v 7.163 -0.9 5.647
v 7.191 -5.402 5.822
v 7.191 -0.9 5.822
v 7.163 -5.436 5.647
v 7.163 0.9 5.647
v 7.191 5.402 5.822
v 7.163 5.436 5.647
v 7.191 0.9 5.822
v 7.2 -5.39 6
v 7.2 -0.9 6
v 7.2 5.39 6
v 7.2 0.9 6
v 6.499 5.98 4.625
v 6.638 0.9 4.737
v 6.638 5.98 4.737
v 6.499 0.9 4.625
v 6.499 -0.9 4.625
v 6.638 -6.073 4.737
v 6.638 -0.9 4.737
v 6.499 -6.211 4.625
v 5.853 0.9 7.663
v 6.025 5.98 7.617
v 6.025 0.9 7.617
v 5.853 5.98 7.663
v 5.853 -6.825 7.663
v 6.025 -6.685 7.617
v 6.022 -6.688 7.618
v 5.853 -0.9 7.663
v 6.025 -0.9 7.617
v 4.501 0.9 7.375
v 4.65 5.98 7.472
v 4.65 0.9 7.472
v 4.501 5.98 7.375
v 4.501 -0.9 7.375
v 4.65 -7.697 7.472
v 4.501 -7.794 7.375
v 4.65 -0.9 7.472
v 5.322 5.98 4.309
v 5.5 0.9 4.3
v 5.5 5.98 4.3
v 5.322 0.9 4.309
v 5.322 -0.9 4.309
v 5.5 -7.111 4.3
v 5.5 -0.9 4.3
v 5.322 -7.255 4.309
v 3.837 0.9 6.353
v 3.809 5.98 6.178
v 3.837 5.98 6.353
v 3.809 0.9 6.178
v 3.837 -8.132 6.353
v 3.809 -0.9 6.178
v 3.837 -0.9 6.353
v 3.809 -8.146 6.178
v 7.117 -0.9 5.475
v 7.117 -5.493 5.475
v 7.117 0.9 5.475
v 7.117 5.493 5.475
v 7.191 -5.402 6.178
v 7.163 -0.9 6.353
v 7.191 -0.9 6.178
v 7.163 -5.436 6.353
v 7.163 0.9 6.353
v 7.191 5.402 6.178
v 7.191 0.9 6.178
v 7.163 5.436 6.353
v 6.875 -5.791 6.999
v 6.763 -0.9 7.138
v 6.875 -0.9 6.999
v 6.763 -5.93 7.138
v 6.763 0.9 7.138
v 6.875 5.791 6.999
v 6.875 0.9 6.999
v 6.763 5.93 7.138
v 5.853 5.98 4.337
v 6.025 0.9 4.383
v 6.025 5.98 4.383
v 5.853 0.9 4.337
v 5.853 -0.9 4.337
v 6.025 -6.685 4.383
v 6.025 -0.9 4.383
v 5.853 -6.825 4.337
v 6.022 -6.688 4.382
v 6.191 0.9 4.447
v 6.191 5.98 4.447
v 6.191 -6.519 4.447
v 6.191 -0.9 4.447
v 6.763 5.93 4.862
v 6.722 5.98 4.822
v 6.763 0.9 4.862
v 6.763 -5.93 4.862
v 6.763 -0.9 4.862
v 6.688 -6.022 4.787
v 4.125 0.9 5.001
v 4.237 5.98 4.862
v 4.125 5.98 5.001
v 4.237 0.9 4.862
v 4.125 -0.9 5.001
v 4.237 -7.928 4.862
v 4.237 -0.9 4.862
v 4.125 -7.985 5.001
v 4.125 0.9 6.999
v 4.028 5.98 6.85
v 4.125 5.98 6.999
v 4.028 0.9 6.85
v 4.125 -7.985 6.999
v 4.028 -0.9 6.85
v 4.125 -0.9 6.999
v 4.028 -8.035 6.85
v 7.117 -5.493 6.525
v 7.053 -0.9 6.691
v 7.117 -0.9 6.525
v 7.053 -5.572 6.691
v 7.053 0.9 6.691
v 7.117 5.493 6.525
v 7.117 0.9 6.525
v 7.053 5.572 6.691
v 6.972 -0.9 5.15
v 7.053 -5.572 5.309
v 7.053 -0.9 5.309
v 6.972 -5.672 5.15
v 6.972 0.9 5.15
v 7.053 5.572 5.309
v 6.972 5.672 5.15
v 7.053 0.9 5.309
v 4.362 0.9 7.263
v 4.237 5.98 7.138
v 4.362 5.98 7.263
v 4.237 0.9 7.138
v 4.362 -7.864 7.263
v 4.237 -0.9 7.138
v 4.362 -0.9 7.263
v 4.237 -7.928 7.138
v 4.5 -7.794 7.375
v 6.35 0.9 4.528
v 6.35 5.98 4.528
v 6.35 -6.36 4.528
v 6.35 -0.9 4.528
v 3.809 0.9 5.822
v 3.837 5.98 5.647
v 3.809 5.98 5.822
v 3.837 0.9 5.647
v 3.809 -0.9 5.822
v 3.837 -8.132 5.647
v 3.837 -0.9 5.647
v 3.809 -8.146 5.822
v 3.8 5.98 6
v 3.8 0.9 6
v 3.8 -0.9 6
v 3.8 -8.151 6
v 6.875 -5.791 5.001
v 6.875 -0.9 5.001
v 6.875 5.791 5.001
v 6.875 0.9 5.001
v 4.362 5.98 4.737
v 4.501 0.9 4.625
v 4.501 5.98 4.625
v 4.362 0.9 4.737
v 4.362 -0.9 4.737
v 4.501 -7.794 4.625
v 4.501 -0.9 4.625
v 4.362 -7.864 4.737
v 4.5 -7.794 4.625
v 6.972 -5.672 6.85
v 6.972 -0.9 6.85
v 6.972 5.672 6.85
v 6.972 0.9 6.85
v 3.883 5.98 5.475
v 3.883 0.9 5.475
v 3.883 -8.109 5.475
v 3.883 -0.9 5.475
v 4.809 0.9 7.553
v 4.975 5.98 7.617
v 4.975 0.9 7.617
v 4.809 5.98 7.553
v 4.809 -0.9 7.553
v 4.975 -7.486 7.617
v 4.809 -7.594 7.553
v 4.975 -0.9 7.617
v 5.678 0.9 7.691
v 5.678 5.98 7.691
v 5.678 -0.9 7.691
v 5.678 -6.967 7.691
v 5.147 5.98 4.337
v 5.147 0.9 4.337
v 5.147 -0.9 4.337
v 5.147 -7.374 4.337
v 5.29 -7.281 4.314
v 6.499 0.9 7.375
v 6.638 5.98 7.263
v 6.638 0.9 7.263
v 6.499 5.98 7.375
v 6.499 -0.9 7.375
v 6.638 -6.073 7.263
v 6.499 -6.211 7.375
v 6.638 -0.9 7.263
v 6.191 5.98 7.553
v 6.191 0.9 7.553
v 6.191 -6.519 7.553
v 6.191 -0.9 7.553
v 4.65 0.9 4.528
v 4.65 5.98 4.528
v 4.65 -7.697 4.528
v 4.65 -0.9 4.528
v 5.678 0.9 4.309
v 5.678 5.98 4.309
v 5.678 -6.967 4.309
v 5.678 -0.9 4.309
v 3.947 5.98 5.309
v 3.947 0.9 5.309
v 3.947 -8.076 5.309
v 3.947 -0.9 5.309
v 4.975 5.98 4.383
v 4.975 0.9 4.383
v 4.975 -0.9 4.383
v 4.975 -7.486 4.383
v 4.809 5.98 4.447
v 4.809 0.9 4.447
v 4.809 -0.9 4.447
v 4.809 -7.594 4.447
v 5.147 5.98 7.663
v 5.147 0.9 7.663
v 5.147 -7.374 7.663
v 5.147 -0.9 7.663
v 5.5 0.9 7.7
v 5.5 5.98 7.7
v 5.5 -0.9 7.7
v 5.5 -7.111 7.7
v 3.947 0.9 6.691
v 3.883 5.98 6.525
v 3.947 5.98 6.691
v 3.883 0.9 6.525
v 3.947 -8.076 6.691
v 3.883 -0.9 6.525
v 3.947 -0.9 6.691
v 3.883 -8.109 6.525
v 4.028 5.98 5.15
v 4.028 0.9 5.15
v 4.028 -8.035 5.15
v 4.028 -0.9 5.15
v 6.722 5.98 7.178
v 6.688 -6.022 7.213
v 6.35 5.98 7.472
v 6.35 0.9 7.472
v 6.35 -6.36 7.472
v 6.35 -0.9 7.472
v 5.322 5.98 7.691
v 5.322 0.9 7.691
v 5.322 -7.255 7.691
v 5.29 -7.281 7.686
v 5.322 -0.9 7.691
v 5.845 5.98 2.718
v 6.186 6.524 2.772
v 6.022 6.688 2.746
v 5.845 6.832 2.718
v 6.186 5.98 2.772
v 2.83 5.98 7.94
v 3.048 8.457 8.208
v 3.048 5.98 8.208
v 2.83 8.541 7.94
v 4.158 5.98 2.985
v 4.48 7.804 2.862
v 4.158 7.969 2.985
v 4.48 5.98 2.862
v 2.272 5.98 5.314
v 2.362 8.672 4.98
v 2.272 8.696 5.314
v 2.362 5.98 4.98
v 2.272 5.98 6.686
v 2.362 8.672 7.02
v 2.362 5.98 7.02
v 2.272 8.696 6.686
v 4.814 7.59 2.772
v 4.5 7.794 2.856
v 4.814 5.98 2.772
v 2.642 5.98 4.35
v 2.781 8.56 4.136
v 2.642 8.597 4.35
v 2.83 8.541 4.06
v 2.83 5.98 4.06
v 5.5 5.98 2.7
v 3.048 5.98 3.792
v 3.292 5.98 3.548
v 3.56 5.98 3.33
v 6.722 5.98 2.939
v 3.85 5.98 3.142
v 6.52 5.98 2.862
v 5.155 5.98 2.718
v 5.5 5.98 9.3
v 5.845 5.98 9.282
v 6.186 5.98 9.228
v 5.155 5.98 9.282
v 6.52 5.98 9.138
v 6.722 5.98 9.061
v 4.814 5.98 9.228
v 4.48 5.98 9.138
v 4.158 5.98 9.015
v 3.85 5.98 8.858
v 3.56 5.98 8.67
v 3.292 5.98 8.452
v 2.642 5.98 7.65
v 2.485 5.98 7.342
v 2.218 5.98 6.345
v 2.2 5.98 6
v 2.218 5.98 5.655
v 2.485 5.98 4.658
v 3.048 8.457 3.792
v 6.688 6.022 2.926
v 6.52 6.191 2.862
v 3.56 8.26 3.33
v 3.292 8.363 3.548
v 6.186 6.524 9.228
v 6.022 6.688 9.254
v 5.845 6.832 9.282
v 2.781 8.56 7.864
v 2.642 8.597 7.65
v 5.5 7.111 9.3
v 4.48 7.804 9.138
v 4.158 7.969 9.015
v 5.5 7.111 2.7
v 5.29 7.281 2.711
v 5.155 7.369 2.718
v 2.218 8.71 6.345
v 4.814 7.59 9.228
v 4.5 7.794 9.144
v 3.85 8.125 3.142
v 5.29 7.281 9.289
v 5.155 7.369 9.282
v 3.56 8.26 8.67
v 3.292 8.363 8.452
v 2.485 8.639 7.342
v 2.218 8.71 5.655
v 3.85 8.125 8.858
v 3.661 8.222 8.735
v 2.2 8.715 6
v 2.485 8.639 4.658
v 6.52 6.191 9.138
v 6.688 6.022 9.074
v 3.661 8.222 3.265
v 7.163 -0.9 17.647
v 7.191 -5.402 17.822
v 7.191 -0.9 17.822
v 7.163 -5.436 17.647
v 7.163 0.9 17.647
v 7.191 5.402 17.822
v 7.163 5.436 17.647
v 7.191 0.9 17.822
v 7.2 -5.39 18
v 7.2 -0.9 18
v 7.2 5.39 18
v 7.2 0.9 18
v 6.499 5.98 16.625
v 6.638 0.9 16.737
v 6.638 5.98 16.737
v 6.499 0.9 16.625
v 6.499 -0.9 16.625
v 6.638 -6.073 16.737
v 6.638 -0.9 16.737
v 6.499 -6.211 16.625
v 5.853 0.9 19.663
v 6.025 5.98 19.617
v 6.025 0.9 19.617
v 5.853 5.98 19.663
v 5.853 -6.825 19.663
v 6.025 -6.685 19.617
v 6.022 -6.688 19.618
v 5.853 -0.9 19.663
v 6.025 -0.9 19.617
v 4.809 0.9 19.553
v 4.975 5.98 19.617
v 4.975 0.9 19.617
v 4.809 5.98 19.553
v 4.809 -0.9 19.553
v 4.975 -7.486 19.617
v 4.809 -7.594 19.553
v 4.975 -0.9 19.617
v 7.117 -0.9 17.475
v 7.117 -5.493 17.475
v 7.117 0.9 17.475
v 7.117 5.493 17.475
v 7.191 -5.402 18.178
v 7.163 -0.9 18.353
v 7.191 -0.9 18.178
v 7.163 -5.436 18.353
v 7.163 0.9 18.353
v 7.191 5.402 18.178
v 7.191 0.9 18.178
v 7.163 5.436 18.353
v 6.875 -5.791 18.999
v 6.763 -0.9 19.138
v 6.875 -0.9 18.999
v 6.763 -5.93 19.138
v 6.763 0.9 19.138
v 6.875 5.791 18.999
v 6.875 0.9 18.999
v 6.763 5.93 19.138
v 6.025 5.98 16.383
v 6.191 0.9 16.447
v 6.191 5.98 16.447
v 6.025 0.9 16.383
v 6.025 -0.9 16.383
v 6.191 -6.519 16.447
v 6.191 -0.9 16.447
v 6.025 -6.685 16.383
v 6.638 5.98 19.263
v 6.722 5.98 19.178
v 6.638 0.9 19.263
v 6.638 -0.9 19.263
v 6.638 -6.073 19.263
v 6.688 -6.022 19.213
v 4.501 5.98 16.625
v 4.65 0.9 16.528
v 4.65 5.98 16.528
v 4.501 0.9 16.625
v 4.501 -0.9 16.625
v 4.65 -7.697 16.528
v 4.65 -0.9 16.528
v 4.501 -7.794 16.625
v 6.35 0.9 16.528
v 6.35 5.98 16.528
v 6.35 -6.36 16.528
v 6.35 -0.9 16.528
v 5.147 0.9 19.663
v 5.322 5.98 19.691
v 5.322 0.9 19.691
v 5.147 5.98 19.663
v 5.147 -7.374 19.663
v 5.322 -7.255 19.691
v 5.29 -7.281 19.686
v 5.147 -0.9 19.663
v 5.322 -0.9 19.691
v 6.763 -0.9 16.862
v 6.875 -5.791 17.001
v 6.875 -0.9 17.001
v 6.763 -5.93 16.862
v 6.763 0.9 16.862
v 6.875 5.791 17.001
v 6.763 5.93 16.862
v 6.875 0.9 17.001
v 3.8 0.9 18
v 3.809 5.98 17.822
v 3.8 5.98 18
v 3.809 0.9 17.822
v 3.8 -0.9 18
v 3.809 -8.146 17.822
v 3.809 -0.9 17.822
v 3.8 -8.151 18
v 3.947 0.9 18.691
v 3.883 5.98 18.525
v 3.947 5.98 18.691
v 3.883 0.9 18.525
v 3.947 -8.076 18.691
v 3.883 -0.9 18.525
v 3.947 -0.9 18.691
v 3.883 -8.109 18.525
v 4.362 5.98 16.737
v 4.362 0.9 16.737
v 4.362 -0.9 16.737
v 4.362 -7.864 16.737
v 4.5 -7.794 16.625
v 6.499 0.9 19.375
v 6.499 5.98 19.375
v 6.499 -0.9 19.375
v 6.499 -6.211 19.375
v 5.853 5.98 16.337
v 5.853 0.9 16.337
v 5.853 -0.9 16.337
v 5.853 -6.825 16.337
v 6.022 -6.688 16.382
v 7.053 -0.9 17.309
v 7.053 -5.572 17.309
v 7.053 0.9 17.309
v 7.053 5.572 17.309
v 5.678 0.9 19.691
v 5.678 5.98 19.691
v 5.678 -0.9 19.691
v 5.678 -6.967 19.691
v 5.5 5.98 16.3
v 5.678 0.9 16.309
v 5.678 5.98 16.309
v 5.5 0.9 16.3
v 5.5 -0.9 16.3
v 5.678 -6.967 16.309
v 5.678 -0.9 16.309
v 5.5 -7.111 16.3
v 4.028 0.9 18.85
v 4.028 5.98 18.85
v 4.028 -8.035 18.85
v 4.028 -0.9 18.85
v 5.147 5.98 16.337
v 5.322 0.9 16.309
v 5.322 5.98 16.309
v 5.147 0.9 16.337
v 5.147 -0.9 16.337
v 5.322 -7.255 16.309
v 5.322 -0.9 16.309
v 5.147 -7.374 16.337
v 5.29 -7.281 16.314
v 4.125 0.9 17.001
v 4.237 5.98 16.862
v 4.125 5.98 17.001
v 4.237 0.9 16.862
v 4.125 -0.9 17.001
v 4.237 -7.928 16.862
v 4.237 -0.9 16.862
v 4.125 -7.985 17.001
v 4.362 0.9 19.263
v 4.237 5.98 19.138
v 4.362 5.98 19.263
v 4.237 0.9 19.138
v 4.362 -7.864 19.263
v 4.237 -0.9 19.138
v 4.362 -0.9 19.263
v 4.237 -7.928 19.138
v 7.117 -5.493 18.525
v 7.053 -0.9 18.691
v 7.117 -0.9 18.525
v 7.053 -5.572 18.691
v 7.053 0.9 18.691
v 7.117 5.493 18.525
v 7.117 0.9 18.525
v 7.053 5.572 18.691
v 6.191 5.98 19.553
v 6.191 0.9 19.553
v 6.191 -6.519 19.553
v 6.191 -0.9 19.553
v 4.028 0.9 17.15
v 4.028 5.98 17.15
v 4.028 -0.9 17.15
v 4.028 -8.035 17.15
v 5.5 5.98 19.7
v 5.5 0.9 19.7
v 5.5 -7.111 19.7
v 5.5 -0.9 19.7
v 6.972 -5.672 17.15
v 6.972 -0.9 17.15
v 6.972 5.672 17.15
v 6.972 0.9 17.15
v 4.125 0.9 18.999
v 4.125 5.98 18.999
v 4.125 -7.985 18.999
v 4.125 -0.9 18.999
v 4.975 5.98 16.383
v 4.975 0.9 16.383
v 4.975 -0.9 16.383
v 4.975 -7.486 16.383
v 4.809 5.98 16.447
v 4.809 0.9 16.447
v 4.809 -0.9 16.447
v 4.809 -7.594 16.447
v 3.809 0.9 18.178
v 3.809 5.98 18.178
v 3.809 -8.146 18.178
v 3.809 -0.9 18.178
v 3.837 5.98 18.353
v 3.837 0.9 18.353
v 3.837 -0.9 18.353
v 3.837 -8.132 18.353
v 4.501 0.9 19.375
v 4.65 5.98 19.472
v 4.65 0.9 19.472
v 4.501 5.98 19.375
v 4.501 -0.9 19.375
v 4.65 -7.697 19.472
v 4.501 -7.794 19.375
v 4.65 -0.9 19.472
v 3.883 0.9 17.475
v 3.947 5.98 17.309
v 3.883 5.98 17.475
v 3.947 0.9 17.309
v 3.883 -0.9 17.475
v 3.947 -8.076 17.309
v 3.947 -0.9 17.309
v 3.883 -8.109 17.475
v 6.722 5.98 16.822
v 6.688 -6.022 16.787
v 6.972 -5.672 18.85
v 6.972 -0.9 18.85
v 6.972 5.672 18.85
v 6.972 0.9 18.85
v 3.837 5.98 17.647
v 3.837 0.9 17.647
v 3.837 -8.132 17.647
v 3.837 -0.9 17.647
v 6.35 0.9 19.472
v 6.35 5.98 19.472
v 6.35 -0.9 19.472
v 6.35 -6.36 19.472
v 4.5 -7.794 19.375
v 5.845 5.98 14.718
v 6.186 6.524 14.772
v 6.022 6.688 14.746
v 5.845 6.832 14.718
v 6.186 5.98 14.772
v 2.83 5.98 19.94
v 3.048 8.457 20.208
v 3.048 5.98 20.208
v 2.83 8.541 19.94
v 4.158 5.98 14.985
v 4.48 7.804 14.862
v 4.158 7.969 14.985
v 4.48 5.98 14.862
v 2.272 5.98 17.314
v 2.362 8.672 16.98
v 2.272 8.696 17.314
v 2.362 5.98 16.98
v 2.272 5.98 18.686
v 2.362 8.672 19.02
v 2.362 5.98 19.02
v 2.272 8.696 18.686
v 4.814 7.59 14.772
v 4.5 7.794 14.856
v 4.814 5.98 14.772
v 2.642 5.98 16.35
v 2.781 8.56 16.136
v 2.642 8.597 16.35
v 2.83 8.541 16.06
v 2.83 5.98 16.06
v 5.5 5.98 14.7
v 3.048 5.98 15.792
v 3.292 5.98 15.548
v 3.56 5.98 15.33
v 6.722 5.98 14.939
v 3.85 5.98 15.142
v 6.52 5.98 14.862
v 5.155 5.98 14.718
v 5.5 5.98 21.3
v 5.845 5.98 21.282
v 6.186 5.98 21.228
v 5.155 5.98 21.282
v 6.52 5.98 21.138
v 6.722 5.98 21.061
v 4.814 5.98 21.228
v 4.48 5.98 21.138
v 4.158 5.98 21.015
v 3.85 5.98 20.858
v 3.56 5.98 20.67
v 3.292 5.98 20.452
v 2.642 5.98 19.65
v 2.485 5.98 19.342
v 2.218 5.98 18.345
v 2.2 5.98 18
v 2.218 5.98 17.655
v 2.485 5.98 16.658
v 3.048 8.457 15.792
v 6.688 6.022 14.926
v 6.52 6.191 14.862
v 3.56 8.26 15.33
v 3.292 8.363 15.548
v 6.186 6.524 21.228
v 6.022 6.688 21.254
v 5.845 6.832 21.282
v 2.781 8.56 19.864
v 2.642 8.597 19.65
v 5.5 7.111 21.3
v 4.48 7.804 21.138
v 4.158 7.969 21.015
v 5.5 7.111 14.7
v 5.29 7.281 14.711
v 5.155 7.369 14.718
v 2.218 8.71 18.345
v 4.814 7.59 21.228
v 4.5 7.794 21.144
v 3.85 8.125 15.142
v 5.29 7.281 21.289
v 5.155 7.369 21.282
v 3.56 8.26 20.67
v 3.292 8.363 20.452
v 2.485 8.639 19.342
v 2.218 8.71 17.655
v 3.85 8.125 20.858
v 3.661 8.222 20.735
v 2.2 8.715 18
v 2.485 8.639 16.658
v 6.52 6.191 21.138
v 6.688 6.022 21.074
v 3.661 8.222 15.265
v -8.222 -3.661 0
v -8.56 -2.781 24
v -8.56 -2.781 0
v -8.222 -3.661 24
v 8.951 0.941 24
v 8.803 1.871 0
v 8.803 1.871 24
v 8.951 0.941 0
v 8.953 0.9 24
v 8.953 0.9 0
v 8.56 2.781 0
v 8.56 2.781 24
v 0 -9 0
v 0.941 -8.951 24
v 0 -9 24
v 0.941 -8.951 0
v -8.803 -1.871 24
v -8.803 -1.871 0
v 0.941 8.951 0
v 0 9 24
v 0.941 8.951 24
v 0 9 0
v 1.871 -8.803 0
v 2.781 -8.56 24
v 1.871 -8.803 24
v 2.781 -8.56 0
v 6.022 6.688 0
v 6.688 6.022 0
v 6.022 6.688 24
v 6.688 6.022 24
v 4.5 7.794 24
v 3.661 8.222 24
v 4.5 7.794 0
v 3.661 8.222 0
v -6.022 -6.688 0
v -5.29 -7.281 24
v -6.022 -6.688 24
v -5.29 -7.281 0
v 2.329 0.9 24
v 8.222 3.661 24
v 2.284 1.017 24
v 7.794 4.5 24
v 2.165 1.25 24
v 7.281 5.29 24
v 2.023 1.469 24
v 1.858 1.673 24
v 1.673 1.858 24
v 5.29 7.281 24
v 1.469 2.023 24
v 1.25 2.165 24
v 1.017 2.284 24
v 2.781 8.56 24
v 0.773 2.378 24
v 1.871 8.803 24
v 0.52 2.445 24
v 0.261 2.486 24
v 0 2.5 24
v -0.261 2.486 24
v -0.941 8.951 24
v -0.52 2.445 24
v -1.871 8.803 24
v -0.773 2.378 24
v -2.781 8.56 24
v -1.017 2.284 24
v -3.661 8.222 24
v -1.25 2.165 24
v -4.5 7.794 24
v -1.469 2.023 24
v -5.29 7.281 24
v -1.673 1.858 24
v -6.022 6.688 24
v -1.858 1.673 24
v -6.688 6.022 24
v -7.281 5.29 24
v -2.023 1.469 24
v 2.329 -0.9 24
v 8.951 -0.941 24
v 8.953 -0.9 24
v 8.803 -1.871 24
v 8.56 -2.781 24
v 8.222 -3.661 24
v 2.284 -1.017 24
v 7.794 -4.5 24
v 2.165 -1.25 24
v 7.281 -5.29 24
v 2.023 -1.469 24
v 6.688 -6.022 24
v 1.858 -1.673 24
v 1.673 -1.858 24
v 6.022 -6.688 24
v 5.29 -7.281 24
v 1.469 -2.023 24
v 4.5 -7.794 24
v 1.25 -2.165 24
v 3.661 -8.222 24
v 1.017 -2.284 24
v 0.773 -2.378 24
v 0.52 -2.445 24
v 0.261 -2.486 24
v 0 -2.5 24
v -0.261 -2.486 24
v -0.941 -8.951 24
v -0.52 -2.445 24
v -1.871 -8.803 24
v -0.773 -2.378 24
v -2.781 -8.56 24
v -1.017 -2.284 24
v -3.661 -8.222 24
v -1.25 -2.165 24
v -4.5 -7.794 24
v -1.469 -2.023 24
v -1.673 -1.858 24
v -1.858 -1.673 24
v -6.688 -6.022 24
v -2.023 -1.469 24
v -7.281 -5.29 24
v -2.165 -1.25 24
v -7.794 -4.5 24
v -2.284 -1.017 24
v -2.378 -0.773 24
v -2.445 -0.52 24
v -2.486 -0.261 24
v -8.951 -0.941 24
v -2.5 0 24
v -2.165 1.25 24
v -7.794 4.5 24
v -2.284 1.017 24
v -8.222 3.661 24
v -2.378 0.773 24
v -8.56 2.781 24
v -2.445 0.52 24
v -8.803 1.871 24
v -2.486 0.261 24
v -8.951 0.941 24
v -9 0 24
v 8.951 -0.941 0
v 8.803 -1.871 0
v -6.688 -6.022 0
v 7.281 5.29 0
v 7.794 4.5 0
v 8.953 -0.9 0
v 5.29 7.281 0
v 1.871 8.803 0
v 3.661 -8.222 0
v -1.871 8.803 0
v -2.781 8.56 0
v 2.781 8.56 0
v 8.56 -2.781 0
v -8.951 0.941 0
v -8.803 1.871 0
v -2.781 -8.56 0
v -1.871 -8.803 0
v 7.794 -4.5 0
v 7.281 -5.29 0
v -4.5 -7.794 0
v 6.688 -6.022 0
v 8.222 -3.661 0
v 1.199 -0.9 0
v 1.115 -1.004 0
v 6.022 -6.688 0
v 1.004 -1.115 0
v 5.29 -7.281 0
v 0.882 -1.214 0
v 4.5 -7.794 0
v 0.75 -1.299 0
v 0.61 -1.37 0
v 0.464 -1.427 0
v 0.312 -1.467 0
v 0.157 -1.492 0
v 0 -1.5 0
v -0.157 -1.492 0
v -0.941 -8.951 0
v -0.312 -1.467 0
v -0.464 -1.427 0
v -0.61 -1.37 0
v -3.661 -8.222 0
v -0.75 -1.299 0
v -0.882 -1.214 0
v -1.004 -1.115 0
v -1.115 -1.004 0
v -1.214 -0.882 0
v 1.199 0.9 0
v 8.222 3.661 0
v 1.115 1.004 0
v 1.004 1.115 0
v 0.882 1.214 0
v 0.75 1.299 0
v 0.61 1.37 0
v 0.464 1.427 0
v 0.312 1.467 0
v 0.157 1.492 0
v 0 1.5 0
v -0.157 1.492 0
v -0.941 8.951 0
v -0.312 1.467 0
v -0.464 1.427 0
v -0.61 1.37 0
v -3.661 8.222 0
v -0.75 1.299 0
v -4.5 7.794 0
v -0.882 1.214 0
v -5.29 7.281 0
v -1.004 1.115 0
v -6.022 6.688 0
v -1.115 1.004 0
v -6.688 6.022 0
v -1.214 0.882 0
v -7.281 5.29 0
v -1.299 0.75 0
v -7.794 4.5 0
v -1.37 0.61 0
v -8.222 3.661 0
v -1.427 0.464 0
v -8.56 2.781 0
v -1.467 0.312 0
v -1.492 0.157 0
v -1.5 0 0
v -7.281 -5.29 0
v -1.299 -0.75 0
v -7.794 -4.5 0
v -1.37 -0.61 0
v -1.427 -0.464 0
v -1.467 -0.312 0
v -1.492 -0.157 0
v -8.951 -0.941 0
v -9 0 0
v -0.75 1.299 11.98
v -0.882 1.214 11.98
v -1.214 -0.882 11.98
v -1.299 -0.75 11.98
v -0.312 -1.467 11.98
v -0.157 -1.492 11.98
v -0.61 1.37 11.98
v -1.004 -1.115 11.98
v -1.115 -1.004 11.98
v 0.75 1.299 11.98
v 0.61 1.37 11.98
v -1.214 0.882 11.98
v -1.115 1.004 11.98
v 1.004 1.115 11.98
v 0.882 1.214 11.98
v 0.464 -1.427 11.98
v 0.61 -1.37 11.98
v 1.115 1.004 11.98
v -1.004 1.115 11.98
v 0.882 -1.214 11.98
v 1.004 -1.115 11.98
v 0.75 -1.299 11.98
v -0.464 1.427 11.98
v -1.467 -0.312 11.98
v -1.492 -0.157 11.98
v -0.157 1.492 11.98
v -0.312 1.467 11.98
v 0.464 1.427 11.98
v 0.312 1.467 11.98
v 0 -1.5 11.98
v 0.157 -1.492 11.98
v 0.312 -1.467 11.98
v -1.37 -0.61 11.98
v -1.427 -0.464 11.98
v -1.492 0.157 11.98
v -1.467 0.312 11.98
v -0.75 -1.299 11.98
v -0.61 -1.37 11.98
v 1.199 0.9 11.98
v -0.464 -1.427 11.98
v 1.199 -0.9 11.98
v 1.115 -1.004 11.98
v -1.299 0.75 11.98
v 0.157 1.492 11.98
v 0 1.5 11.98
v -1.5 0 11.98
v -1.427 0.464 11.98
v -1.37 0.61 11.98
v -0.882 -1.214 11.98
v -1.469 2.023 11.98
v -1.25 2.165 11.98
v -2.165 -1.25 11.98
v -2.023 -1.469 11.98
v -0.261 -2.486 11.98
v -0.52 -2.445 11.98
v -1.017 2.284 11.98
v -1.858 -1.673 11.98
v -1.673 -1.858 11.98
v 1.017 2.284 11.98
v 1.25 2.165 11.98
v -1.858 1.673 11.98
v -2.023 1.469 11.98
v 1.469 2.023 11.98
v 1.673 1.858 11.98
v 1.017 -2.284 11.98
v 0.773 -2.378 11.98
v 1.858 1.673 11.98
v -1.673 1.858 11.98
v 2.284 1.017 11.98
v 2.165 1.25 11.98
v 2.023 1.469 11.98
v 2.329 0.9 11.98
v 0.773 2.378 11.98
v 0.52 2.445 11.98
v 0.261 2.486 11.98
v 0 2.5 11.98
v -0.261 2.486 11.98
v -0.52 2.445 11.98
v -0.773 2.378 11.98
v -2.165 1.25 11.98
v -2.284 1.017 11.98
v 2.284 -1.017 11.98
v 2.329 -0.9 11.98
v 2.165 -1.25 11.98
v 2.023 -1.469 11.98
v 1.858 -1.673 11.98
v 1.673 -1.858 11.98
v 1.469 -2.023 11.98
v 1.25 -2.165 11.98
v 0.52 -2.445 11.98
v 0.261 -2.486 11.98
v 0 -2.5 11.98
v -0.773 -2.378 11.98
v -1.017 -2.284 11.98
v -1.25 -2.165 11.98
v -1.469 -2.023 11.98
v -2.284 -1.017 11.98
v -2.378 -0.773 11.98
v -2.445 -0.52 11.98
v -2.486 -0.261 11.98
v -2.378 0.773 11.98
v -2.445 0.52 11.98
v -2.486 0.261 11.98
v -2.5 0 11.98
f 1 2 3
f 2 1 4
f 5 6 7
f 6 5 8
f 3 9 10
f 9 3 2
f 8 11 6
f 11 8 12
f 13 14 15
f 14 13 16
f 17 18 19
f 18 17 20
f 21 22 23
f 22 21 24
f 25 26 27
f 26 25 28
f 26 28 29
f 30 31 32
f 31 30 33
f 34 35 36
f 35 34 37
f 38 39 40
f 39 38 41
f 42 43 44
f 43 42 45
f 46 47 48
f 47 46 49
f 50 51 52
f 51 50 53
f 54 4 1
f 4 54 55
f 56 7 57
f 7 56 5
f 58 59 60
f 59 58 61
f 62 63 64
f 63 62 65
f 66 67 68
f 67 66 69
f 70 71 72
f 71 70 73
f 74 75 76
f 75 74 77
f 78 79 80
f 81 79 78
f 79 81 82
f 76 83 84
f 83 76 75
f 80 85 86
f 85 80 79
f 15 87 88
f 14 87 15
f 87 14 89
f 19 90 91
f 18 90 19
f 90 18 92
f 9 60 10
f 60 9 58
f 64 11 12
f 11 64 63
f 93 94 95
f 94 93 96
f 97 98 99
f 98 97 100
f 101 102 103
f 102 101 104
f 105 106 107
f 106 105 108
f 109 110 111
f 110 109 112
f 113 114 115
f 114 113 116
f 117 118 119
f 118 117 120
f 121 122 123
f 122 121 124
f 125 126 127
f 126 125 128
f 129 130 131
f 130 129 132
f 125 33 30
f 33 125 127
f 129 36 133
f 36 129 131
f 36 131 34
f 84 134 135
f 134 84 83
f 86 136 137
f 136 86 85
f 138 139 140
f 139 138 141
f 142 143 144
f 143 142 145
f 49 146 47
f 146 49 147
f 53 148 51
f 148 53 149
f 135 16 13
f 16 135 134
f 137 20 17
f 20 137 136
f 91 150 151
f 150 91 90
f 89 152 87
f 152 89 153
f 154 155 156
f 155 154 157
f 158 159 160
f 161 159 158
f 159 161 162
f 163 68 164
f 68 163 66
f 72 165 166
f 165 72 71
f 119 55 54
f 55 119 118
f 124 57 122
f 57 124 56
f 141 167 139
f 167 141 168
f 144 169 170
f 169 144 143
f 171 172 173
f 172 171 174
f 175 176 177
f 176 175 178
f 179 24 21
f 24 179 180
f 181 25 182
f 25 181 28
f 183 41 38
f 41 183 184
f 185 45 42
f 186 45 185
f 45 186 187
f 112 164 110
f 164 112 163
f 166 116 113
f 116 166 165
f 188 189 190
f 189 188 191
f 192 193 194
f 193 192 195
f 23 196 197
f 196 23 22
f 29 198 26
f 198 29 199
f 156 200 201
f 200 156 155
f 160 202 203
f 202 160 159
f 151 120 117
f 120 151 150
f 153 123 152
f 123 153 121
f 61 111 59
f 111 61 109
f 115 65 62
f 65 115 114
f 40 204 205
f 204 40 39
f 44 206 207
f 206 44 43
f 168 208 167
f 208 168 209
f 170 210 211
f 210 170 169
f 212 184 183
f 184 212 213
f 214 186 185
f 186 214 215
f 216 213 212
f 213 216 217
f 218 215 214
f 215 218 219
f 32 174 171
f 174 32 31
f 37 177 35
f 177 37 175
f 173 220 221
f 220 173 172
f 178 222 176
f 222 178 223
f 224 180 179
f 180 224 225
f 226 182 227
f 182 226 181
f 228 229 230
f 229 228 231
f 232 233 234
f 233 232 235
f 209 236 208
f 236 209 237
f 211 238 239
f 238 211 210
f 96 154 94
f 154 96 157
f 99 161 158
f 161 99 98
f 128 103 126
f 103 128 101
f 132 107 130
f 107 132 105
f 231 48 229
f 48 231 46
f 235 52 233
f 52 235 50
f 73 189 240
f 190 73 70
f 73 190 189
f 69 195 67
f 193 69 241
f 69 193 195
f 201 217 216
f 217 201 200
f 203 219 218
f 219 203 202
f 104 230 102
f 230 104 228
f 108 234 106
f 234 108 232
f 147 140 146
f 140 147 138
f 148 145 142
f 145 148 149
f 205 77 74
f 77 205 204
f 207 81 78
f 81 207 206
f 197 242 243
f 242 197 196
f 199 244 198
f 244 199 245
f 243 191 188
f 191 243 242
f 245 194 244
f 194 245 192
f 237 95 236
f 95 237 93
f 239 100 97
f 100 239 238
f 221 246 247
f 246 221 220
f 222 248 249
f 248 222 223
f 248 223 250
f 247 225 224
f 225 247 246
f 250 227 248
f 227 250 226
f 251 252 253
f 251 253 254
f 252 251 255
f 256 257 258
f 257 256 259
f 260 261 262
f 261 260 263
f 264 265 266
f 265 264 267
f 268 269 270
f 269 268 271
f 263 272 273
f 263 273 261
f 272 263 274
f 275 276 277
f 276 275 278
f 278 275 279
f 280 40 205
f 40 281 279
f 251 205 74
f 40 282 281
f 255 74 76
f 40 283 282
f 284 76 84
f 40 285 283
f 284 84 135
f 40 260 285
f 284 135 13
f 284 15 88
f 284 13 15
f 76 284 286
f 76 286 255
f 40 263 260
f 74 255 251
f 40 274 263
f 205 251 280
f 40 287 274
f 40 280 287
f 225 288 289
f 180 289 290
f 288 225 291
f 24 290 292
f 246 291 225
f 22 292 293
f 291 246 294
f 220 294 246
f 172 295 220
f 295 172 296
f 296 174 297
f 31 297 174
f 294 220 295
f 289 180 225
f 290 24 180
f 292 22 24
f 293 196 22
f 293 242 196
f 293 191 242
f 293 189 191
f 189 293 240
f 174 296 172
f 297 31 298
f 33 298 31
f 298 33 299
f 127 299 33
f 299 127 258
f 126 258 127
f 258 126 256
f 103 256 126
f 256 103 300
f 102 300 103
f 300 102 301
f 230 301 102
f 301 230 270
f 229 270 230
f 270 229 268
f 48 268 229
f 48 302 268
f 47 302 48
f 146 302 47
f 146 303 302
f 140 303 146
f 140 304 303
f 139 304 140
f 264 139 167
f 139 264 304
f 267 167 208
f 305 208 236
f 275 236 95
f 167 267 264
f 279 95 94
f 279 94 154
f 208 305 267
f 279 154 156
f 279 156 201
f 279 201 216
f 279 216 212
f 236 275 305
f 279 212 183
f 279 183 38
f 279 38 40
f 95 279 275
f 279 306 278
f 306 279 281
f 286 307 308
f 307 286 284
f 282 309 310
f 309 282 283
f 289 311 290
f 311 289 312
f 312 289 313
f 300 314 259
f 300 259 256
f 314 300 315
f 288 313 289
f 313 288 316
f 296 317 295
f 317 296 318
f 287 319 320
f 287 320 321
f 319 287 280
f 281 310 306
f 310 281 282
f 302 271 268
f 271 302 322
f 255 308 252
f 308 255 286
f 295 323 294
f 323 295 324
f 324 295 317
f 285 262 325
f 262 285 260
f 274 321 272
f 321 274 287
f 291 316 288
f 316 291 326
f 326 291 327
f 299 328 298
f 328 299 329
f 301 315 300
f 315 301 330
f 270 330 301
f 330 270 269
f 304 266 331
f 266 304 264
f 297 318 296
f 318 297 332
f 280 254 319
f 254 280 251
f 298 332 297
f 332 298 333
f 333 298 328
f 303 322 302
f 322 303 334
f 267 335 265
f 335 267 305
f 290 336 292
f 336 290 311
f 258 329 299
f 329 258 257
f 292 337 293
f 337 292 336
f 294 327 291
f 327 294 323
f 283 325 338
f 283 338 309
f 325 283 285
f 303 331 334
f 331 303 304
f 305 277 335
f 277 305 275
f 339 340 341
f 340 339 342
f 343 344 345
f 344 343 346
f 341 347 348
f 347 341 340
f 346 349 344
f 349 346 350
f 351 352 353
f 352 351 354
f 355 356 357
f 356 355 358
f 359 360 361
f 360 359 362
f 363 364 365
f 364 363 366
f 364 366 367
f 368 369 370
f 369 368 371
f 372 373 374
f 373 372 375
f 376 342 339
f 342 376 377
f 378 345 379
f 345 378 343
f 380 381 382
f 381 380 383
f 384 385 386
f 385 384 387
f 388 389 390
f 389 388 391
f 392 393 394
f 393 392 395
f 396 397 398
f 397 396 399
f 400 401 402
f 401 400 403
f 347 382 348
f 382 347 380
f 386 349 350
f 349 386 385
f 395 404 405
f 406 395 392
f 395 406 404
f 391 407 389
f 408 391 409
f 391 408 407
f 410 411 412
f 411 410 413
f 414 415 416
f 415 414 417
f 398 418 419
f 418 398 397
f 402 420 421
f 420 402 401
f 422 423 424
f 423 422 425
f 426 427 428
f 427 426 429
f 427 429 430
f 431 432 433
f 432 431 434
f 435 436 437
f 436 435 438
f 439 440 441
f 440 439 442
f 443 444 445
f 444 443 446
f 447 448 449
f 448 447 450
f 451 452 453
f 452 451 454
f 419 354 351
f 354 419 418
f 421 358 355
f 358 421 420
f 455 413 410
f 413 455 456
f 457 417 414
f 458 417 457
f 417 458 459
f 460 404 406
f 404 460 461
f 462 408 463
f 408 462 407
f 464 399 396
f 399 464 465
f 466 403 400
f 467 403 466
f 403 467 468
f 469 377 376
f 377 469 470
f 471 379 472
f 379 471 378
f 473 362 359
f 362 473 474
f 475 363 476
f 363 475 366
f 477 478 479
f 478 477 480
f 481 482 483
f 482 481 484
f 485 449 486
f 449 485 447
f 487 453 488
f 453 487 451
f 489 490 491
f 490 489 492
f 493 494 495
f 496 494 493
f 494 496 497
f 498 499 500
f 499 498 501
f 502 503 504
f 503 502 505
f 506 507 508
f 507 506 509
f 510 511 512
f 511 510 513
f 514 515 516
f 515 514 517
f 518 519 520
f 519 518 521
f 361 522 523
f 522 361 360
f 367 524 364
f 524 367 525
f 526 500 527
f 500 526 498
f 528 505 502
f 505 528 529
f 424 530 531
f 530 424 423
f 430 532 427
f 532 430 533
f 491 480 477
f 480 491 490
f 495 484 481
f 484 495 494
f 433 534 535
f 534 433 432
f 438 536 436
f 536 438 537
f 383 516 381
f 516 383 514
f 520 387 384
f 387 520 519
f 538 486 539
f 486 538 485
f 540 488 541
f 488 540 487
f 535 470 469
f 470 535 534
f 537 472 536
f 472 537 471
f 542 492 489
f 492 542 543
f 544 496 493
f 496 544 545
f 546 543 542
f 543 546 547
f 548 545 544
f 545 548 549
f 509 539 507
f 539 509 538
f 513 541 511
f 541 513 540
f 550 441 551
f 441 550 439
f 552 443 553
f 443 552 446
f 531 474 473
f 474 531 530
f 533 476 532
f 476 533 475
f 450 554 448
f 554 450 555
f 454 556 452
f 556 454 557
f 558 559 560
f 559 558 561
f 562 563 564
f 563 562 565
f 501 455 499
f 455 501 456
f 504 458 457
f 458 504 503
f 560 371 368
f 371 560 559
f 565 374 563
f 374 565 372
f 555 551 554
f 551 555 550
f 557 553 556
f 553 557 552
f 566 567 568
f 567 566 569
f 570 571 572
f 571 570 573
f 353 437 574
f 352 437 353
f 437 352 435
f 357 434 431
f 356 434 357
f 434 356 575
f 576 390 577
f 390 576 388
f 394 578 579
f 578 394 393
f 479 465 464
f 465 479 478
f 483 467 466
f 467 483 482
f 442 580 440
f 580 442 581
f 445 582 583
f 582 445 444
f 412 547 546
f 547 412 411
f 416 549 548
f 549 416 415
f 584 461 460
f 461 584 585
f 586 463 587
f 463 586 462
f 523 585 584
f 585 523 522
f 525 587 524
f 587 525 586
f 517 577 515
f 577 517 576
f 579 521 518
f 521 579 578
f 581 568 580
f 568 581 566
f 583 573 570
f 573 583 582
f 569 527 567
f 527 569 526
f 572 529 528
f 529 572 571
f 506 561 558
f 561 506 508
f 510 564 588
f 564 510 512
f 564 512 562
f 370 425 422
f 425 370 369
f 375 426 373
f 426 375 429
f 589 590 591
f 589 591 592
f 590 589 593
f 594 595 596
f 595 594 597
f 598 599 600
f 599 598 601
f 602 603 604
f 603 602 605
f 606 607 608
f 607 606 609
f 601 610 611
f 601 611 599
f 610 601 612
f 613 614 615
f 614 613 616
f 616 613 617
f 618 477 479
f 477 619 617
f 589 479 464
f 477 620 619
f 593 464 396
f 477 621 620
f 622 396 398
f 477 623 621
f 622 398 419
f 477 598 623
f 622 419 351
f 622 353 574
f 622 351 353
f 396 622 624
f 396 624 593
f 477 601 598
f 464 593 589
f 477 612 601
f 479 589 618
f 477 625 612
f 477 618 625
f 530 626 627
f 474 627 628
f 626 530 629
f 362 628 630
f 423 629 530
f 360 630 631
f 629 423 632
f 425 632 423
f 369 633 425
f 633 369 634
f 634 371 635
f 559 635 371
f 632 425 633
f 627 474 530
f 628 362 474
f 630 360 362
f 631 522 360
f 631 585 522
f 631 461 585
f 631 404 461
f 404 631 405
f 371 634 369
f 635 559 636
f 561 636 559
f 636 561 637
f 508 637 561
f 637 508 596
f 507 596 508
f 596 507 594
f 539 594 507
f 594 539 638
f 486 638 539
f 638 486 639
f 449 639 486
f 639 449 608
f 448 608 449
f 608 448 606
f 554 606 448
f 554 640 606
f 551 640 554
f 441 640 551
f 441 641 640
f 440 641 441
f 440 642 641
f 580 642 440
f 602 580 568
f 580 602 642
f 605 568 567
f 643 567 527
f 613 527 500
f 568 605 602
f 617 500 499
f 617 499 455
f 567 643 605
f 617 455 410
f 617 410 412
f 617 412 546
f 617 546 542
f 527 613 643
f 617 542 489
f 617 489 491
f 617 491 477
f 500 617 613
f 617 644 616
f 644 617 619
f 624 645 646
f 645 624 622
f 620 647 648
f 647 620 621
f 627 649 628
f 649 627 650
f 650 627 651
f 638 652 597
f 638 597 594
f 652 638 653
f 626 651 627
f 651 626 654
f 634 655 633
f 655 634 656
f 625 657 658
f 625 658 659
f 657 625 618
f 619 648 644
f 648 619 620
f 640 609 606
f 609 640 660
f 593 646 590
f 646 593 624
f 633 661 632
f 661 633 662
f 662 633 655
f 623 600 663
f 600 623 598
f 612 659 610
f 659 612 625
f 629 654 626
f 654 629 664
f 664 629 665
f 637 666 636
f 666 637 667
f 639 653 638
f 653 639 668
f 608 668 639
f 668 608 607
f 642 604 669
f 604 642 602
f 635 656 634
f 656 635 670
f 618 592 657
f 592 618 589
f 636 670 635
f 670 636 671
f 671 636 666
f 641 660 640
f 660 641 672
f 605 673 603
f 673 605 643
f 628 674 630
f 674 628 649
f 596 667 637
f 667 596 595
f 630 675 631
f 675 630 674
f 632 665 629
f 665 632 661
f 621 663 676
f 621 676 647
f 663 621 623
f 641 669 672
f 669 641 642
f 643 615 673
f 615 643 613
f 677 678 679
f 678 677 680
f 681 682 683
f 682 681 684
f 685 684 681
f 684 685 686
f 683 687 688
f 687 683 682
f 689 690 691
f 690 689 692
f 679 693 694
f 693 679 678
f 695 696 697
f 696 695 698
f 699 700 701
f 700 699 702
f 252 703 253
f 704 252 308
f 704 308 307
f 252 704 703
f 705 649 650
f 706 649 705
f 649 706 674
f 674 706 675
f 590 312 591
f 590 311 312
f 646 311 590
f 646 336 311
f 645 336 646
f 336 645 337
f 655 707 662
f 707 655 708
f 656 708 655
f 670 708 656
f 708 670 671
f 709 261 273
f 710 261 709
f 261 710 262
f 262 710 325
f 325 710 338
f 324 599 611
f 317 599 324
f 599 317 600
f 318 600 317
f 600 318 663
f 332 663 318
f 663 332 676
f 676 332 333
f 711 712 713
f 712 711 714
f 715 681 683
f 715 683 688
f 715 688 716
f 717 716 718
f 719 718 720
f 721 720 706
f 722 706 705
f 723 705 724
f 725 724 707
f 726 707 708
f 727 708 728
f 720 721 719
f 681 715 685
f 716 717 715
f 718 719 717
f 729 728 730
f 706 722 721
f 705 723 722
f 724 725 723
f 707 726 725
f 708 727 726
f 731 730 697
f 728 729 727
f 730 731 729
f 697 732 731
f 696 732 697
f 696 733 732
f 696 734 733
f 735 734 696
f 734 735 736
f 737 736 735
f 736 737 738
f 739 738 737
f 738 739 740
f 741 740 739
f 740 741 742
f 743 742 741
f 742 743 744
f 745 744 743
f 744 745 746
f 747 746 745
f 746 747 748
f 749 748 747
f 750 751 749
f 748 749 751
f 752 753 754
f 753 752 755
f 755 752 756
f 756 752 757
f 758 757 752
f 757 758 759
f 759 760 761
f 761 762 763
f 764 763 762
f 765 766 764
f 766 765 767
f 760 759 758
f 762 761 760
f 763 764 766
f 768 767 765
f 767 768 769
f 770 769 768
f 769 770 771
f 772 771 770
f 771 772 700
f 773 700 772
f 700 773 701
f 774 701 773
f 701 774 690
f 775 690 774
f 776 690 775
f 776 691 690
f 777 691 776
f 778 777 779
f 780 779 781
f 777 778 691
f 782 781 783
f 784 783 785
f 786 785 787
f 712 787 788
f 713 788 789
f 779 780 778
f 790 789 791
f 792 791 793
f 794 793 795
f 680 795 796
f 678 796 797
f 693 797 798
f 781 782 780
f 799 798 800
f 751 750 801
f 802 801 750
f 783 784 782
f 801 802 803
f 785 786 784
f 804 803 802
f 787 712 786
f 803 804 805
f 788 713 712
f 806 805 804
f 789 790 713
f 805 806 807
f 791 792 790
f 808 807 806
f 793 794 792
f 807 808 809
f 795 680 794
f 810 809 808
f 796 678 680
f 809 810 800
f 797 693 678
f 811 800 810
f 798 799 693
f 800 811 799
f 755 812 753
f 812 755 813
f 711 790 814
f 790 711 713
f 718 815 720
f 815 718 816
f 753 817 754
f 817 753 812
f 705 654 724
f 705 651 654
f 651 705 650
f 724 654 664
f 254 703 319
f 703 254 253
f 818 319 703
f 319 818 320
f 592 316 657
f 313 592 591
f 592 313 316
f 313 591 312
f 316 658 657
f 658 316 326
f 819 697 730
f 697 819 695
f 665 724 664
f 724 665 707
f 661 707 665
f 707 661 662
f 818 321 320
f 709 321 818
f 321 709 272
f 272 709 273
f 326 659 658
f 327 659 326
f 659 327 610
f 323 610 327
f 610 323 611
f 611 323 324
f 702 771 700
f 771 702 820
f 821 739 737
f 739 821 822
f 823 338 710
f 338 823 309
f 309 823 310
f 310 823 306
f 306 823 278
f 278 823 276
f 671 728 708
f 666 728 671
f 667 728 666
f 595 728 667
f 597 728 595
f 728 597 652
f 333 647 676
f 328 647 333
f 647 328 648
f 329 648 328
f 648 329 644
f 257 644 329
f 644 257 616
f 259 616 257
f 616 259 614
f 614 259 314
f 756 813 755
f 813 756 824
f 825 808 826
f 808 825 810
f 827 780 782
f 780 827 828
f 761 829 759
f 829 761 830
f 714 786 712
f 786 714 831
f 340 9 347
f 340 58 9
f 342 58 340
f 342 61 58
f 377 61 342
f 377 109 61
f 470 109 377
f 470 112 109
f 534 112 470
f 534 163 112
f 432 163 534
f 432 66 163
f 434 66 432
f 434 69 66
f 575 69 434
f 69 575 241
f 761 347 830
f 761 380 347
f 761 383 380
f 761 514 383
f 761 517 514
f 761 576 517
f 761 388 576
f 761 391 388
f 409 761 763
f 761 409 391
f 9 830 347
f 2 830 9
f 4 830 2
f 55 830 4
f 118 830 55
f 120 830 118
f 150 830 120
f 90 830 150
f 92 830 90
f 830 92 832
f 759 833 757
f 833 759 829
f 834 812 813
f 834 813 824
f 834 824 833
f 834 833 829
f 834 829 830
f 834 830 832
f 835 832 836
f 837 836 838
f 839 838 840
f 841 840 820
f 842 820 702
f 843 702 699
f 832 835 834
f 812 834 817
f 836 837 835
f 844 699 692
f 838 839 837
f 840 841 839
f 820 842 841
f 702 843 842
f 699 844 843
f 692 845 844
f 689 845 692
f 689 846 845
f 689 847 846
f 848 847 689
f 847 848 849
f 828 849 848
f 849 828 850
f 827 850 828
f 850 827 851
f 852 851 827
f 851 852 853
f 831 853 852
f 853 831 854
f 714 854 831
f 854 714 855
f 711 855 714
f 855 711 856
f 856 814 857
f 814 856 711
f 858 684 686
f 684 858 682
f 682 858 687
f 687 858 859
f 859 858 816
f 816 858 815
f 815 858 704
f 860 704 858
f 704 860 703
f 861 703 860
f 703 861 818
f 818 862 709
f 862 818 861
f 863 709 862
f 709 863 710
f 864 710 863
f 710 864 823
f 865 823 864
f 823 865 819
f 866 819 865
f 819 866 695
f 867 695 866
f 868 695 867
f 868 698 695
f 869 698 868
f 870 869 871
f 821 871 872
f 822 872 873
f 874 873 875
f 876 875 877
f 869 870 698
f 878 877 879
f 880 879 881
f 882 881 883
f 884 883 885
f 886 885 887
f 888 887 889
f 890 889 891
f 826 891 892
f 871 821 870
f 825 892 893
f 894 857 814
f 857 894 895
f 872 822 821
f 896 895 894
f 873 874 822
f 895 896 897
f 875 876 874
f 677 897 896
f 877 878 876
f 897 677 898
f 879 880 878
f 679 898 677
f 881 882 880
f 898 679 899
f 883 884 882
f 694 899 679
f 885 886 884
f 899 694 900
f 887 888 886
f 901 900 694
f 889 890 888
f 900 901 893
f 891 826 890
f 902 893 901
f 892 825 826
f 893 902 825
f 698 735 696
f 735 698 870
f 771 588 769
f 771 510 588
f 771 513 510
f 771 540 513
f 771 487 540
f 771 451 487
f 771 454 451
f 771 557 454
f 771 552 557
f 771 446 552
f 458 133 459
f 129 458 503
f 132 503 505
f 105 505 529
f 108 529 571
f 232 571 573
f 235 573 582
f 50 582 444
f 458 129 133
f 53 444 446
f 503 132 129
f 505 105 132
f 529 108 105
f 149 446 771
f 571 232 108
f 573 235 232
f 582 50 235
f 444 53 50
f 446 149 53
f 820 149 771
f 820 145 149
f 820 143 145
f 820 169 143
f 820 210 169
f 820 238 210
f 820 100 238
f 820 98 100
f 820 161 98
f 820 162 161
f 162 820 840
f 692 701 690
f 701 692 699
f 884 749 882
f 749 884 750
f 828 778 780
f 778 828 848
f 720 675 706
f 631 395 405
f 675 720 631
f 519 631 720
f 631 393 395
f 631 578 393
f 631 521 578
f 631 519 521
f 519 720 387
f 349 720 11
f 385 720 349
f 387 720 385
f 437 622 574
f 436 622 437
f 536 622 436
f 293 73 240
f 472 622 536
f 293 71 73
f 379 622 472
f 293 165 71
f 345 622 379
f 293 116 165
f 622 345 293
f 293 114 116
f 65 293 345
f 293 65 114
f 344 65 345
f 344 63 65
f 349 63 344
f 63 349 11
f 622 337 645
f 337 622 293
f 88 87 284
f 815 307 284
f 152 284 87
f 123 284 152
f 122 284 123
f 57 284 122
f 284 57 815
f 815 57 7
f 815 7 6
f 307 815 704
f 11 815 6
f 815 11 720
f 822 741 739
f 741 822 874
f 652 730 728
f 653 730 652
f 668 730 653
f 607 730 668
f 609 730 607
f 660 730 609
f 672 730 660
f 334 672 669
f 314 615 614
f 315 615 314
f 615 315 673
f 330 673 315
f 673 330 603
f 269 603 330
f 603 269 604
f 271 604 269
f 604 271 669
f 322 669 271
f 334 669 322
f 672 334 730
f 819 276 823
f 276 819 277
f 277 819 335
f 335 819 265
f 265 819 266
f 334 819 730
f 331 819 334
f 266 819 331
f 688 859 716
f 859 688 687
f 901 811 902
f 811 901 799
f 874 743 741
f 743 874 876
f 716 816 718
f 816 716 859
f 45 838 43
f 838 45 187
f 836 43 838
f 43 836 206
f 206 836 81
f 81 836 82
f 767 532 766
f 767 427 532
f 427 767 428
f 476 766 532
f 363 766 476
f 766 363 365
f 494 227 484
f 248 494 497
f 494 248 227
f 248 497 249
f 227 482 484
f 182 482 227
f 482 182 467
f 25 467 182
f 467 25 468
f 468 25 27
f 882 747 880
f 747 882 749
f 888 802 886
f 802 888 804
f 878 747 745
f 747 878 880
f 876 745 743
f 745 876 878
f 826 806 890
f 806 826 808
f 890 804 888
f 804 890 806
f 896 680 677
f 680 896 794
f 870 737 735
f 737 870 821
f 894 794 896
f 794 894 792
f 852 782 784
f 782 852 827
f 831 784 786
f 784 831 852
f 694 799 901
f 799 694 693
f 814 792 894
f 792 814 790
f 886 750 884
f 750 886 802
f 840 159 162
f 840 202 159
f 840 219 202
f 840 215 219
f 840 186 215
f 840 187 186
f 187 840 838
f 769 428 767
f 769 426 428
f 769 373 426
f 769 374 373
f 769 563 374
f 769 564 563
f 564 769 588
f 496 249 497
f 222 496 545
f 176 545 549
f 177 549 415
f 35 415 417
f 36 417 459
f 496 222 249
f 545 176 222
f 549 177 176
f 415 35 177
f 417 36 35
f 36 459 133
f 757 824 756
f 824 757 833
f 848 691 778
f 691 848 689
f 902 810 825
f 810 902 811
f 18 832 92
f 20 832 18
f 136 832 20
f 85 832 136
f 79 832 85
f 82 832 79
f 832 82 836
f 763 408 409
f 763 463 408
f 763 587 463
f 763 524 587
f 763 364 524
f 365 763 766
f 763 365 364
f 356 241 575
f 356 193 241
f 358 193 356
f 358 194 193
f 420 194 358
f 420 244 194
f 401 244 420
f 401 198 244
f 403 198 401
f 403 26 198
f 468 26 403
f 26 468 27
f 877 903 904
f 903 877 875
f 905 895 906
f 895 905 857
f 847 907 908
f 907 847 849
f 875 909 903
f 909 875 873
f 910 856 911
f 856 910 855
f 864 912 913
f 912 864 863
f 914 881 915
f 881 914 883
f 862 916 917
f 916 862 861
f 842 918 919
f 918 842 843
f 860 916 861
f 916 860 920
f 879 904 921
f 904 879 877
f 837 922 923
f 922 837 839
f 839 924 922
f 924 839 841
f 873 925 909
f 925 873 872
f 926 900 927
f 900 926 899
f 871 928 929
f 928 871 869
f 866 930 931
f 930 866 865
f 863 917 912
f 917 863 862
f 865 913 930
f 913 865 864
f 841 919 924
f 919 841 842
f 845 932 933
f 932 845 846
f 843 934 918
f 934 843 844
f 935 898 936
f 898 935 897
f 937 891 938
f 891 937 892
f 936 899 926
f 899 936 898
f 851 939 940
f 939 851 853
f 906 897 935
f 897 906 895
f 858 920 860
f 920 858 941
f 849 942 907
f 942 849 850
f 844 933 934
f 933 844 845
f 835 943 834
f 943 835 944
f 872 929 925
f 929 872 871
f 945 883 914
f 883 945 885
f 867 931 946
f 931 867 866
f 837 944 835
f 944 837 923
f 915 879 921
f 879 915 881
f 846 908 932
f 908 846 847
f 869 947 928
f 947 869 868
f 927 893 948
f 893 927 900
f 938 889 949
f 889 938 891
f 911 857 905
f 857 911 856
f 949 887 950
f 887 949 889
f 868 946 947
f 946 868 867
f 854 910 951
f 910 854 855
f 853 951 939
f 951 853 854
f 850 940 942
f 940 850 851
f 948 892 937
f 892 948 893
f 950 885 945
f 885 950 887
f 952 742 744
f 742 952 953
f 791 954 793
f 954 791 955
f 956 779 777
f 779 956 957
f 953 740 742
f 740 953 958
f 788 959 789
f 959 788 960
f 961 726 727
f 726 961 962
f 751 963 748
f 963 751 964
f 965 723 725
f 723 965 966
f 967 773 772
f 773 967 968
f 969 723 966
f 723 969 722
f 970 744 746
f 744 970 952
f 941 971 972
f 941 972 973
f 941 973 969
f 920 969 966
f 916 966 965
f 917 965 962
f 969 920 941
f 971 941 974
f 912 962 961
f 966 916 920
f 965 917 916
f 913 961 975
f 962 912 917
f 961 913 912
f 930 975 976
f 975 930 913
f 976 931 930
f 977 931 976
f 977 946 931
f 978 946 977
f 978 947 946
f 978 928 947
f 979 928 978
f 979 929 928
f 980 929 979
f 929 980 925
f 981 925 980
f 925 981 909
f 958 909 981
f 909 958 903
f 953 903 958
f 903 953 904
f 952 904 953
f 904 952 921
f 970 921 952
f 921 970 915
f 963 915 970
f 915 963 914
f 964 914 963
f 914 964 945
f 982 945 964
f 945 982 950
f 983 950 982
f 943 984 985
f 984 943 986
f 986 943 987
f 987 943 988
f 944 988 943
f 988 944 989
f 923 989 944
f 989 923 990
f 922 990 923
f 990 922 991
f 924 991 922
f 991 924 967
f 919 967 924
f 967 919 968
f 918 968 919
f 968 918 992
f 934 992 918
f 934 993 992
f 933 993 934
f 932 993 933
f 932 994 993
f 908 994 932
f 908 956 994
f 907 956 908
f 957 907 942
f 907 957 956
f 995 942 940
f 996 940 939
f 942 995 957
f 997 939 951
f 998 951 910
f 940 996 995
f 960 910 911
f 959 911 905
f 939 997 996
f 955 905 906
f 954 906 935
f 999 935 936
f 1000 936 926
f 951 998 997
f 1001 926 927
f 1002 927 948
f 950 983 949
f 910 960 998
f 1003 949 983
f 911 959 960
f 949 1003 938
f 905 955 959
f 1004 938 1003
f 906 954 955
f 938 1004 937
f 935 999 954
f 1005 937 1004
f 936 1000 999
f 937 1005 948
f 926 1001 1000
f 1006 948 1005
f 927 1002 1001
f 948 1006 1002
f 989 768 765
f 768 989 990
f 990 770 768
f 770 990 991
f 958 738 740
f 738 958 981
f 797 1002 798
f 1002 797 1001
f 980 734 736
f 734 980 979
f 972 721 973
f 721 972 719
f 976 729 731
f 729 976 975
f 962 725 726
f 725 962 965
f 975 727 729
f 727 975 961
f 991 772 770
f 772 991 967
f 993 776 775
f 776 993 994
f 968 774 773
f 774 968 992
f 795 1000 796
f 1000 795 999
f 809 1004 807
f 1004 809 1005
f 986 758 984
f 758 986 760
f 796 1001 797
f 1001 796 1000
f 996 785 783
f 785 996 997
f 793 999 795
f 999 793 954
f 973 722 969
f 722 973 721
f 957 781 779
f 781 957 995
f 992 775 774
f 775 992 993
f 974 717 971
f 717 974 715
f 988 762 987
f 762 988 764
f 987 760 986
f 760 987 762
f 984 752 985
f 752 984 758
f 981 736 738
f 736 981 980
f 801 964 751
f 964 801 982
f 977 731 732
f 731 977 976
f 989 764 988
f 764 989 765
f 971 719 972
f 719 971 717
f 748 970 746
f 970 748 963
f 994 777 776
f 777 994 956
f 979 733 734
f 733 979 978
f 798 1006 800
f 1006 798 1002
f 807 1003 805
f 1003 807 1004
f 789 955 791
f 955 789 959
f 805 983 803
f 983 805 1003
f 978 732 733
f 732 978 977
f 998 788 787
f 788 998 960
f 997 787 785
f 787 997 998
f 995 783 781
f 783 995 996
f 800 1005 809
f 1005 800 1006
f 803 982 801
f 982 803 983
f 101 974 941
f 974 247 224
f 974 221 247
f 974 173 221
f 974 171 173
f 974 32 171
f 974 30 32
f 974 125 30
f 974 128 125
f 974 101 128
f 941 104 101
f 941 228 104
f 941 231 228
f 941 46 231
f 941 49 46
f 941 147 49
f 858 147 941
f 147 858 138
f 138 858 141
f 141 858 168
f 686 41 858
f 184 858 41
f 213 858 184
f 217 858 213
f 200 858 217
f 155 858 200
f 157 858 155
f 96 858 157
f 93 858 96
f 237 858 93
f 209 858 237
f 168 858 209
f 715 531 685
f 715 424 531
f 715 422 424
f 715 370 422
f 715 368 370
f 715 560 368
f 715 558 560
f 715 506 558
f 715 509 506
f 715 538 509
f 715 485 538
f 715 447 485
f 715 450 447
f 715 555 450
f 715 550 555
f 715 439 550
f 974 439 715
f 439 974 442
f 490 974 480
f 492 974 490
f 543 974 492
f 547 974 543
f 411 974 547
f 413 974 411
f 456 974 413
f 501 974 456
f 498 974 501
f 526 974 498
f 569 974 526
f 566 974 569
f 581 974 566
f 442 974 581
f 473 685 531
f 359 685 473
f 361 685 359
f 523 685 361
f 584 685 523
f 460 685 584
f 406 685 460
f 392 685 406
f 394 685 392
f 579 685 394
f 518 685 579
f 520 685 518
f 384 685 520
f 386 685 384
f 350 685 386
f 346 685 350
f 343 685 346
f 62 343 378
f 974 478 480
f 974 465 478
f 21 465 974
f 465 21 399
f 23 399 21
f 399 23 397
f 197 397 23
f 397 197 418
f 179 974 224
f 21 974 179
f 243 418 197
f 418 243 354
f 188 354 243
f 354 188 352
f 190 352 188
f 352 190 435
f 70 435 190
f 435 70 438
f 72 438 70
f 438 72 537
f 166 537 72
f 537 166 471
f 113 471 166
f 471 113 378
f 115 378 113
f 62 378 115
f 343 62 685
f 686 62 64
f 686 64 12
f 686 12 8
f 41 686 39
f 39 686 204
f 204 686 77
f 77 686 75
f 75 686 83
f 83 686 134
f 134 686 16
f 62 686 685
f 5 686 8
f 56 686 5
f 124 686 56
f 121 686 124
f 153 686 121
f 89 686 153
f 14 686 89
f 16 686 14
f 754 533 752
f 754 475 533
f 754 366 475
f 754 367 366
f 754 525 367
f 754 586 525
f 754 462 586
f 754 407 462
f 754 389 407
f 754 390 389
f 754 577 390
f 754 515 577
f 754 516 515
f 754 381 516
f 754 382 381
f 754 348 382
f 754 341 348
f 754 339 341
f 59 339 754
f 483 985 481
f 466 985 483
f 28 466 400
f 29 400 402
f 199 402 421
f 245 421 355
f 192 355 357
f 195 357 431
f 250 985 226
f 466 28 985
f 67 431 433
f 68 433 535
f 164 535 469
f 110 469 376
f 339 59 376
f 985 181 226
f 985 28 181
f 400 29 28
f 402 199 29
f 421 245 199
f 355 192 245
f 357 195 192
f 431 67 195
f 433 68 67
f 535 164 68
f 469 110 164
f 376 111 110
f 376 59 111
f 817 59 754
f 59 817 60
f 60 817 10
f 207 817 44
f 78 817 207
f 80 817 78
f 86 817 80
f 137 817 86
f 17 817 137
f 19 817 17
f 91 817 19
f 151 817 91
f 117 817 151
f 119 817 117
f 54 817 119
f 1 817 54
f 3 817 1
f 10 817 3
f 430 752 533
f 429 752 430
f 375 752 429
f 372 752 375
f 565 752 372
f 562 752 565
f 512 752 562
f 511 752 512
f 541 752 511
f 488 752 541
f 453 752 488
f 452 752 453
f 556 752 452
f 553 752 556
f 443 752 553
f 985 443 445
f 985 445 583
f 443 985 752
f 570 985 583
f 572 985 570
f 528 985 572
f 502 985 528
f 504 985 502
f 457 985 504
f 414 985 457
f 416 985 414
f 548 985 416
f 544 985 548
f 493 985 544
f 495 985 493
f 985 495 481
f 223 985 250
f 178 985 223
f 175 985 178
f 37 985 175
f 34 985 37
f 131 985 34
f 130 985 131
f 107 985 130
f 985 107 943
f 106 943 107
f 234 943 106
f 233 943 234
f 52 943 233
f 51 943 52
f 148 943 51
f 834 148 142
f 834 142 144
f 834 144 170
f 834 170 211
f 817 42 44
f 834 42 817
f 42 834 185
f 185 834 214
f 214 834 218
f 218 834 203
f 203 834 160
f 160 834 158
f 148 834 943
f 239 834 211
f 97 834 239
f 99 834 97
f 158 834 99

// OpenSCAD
// Split shaft coupling 3 mm to 5 mm.
$fn = 60;
eps = 0.02;
shaft_a = 3;
shaft_b = 5;
outer_d = 18;
length = 24;
slit_w = 1.8;
screw_d = 3.4;
module clamp_hole(z) {
    translate([outer_d / 2 - 3.5, -outer_d / 2 - eps, z]) rotate([-90, 0, 0]) cylinder(d = screw_d, h = outer_d + 2 * eps);
    translate([outer_d / 2 - 3.5, outer_d / 2 - 3 - eps, z]) rotate([-90, 0, 0]) cylinder(d = 6.6, h = 3 + 2 * eps);
}
difference() {
    cylinder(d = outer_d, h = length);
    translate([0, 0, -eps]) cylinder(d = shaft_a, h = length / 2 + eps);
    translate([0, 0, length / 2 - eps]) cylinder(d = shaft_b, h = length / 2 + eps);
    translate([0, -slit_w / 2, -eps]) cube([outer_d / 2 + eps, slit_w, length + 2 * eps]);
    clamp_hole(length / 4);
    clamp_hole(3 * length / 4);
}
